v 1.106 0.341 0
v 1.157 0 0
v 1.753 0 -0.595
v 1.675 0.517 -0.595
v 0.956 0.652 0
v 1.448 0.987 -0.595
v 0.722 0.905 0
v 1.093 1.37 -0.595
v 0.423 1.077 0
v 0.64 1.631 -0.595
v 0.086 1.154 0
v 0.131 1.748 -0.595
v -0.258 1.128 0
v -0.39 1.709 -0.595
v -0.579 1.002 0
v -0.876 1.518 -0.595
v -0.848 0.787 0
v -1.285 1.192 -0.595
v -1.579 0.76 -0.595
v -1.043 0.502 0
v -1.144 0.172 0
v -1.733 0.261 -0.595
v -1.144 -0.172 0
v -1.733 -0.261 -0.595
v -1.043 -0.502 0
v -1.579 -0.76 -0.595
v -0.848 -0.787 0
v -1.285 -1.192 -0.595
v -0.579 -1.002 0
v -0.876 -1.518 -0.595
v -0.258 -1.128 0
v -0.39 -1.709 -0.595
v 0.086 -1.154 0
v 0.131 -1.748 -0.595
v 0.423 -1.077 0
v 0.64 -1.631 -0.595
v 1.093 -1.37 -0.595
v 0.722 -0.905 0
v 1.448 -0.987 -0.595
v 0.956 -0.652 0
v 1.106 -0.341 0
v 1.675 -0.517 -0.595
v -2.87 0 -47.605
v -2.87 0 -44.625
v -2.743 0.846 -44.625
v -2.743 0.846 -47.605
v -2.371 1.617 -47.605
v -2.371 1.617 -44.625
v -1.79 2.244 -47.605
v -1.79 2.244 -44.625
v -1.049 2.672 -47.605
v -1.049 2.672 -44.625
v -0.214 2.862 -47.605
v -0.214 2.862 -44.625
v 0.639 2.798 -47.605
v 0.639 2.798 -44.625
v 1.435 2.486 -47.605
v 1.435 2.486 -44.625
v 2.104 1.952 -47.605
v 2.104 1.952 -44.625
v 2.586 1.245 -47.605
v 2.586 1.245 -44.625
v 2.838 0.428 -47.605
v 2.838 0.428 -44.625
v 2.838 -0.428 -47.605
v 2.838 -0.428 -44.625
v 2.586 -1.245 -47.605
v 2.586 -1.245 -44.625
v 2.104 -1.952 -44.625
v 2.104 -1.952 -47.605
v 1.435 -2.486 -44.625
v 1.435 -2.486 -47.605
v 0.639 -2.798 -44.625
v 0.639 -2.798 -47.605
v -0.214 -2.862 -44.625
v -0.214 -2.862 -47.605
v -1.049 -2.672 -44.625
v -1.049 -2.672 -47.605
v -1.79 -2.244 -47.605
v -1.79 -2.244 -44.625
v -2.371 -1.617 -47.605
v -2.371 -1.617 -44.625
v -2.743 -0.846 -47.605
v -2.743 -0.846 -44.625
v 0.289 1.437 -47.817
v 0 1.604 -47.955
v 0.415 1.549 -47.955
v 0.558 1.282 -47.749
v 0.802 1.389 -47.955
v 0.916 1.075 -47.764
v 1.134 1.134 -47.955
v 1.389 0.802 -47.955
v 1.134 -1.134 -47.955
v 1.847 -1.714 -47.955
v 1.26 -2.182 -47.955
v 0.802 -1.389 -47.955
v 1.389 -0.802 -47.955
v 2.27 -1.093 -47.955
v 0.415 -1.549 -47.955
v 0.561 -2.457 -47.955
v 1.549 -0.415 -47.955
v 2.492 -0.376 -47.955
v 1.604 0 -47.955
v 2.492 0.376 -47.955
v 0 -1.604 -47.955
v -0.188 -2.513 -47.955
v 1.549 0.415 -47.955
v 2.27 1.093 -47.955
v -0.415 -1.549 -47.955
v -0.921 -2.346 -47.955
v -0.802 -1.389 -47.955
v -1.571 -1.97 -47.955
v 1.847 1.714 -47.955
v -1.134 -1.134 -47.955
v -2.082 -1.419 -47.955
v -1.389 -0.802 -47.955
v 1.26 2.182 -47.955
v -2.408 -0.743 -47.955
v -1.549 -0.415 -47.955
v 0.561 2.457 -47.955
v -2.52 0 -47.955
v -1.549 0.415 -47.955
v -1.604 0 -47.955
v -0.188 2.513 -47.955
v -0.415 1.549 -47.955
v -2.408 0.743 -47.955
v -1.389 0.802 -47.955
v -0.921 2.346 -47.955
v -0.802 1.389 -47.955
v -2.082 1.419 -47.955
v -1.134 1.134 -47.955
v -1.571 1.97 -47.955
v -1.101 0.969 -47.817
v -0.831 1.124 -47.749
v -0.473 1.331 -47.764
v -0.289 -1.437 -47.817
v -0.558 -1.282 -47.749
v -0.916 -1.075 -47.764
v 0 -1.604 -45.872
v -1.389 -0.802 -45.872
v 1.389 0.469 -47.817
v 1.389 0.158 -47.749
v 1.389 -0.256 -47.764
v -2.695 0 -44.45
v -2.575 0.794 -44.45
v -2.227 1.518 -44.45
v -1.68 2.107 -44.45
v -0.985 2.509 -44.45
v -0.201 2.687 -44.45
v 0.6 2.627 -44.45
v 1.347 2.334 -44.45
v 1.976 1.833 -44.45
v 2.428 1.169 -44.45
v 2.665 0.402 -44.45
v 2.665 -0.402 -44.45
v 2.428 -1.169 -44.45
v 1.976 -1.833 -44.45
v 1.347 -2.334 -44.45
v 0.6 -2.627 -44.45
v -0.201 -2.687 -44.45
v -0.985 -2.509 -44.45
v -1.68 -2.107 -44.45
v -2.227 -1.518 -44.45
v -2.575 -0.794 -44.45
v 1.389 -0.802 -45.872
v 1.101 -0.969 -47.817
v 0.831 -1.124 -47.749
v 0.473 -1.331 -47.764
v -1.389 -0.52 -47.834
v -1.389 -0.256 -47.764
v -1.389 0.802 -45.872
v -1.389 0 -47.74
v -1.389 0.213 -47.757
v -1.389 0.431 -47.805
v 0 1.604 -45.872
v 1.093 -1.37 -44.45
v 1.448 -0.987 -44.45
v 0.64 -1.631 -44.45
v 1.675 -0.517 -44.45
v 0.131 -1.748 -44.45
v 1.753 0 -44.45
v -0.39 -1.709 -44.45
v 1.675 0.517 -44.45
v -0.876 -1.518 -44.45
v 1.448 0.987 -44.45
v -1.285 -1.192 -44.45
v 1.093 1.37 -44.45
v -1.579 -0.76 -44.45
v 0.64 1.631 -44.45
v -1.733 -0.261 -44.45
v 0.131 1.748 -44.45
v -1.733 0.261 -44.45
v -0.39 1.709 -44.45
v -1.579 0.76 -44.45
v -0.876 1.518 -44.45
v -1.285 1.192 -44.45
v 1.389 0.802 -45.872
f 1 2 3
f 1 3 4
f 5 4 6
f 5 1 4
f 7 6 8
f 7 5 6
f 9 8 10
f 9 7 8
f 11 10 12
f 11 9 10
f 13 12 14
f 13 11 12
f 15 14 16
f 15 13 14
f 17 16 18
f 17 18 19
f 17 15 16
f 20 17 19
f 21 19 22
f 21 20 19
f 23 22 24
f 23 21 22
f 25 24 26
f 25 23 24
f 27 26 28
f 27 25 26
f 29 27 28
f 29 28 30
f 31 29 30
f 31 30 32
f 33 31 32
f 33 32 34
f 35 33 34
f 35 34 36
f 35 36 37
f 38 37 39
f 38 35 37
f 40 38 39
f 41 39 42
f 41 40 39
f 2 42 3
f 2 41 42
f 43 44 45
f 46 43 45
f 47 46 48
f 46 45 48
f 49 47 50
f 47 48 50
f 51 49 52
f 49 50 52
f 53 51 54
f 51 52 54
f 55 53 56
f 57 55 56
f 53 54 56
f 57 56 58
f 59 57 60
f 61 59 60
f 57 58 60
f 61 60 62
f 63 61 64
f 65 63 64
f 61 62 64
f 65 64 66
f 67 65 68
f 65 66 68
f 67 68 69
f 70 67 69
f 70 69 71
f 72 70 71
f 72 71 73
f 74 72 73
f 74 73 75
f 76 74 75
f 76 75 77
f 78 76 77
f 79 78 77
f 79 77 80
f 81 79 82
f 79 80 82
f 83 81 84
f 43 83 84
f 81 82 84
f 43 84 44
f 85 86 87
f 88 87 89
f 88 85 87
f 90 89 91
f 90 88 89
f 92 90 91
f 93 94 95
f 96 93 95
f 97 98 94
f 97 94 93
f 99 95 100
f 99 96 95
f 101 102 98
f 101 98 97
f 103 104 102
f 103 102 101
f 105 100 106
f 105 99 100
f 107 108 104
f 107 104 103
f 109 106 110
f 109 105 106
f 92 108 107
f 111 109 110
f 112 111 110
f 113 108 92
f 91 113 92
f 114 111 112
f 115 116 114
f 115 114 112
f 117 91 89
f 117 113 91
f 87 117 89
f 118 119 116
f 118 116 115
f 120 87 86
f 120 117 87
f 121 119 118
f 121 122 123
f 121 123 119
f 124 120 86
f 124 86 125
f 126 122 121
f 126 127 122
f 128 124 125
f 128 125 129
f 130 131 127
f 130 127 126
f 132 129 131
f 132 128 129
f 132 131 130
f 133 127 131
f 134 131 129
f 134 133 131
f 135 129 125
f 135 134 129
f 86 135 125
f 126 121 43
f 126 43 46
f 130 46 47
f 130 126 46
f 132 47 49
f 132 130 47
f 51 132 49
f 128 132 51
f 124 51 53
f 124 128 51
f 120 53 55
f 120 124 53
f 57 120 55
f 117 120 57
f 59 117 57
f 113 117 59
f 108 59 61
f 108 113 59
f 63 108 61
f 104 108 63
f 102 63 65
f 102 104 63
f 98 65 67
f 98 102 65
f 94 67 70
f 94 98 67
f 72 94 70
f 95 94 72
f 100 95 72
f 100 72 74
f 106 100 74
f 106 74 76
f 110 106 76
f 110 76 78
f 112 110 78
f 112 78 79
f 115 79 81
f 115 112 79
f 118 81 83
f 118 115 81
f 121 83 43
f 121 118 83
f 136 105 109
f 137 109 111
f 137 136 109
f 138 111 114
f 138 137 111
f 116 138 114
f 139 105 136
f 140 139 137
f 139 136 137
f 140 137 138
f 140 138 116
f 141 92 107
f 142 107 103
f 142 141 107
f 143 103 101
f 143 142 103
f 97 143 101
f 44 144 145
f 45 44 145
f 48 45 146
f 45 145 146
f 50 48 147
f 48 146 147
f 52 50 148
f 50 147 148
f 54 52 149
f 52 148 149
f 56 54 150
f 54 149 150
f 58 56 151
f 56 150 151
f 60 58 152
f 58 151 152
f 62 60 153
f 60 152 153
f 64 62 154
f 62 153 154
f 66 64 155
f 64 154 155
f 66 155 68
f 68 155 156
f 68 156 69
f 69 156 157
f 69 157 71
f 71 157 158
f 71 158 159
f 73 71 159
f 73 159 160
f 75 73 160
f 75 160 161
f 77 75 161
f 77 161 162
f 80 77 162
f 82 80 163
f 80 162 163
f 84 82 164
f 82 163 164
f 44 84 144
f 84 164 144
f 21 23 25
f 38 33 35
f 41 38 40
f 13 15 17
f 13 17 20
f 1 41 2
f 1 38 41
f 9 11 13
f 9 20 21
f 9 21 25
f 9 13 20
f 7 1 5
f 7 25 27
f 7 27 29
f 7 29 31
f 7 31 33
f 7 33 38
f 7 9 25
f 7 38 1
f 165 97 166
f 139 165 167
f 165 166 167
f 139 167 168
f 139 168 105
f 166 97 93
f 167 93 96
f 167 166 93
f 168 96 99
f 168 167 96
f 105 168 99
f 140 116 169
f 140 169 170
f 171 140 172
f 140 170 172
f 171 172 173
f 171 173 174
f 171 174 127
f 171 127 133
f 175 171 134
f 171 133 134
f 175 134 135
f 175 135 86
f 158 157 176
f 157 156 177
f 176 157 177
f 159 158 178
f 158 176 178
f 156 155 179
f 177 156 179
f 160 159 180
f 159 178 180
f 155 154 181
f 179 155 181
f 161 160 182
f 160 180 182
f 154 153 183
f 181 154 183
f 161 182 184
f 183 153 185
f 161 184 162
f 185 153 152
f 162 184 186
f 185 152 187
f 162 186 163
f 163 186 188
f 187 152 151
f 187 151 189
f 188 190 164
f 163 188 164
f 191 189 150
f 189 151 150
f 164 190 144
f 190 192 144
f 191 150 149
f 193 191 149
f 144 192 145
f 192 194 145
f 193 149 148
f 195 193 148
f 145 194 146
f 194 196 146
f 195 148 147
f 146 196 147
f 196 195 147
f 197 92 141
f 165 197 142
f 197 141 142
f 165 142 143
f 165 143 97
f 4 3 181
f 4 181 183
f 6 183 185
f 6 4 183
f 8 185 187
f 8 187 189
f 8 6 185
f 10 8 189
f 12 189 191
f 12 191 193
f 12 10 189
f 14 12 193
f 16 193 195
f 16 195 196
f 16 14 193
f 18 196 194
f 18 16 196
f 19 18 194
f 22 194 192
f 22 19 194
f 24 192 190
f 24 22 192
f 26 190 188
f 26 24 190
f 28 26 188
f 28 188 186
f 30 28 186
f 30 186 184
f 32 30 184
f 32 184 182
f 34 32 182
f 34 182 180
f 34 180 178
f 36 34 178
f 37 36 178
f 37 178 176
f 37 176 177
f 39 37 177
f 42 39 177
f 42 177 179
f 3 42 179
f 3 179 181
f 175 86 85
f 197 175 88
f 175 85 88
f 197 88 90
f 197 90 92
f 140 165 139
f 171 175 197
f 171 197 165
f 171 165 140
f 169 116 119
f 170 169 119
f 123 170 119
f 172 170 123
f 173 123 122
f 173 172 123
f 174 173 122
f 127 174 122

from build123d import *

# Parameters (mm, degrees)
SKETCH1_R          = 1.7526
EXTRUDE1_DEPTH     = 44.45
CHAMFER3_SIZE      = 0.5953125
SKETCH6_R          = 2.8702
EXTRUDE2_DEPTH     = 3.5052
CUT_EXTRUDE1_DEPTH = 2.08359375
SKETCH8_R          = 1.603951217
CUT_EXTRUDE2_DEPTH = 0.35052
CUT_EXTRUDE2_DRAFT = -45
CHAMFER1_SIZE      = 0.35052
CHAMFER2_SIZE      = 0.17526


with BuildPart() as part:
    # Sketch1 → Extrude1 (new body)
    with BuildSketch(Plane.XY):
        Circle(SKETCH1_R)
    extrude(amount=-EXTRUDE1_DEPTH)

    # Chamfer3
    chamfer3_edges = [part.edges().sort_by_distance(p)[0] for p in [
        (-1.7526, 0, 0),
    ]]
    chamfer(chamfer3_edges, length=CHAMFER3_SIZE)

    # Sketch5 → partially thread (revolve)
    with BuildSketch(Plane(origin=(0, 0, 0), x_dir=(0, 0, -1), z_dir=(1, 0, 0))):
        Polygon((44.45, 1.7526), (19.05, 1.7526), (17.2974, 0), (19.05, 0), (44.45, 0), align=None)
    revolve(axis=Axis((0, 0, 0), (0, 0, -1)))

    # Sketch6 → Extrude2 (add)
    with BuildSketch(Plane(origin=(0, 0, -44.45), x_dir=(-1, 0, 0), z_dir=(0, 0, -1))):
        Circle(SKETCH6_R)
    extrude(amount=EXTRUDE2_DEPTH)

    # Sketch7 → Cut-Extrude1 (cut)
    with BuildSketch(Plane(origin=(0, 0, -47.9552), x_dir=(-1, 0, 0), z_dir=(0, 0, -1))):
        Polygon((0, 1.603951217), (-1.3890625, 0.801975608), (-1.3890625, -0.801975608), (0, -1.603951217), (1.3890625, -0.801975608), (1.3890625, 0.801975608), align=None)
    extrude(amount=-CUT_EXTRUDE1_DEPTH, mode=Mode.SUBTRACT)


with BuildPart() as cut_extrude2_tool:
    # Sketch8 → Cut-Extrude2 (with draft: the straight prism first)
    with BuildSketch(Plane(origin=(0, 0, -47.9552), x_dir=(-1, 0, 0), z_dir=(0, 0, -1))):
        Circle(SKETCH8_R)
    extrude(amount=-CUT_EXTRUDE2_DEPTH)
    # Cut-Extrude2: the draft: its side faces are tilted about the plane it starts from
    cut_extrude2_sides = [cut_extrude2_tool.faces().sort_by_distance(p)[0] for p in [
        (1.603951217, 0, -47.77994),
    ]]
    draft(cut_extrude2_sides, Plane(origin=(0, 0, -47.9552), x_dir=(-1, 0, 0), z_dir=(0, 0, -1)), CUT_EXTRUDE2_DRAFT)


with BuildPart() as part_1:
    add(part.part)

    # Cut-Extrude2: cut by cut_extrude2_tool
    add(cut_extrude2_tool.part, mode=Mode.SUBTRACT)

    # Chamfer1
    chamfer1_edges = [part_1.edges().sort_by_distance(p)[0] for p in [
        (2.8702, 0, -47.9552),
    ]]
    chamfer(chamfer1_edges, length=CHAMFER1_SIZE)

    # Chamfer2
    chamfer2_edges = [part_1.edges().sort_by_distance(p)[0] for p in [
        (2.8702, 0, -44.45),
    ]]
    chamfer(chamfer2_edges, length=CHAMFER2_SIZE)


solid = part_1.part
